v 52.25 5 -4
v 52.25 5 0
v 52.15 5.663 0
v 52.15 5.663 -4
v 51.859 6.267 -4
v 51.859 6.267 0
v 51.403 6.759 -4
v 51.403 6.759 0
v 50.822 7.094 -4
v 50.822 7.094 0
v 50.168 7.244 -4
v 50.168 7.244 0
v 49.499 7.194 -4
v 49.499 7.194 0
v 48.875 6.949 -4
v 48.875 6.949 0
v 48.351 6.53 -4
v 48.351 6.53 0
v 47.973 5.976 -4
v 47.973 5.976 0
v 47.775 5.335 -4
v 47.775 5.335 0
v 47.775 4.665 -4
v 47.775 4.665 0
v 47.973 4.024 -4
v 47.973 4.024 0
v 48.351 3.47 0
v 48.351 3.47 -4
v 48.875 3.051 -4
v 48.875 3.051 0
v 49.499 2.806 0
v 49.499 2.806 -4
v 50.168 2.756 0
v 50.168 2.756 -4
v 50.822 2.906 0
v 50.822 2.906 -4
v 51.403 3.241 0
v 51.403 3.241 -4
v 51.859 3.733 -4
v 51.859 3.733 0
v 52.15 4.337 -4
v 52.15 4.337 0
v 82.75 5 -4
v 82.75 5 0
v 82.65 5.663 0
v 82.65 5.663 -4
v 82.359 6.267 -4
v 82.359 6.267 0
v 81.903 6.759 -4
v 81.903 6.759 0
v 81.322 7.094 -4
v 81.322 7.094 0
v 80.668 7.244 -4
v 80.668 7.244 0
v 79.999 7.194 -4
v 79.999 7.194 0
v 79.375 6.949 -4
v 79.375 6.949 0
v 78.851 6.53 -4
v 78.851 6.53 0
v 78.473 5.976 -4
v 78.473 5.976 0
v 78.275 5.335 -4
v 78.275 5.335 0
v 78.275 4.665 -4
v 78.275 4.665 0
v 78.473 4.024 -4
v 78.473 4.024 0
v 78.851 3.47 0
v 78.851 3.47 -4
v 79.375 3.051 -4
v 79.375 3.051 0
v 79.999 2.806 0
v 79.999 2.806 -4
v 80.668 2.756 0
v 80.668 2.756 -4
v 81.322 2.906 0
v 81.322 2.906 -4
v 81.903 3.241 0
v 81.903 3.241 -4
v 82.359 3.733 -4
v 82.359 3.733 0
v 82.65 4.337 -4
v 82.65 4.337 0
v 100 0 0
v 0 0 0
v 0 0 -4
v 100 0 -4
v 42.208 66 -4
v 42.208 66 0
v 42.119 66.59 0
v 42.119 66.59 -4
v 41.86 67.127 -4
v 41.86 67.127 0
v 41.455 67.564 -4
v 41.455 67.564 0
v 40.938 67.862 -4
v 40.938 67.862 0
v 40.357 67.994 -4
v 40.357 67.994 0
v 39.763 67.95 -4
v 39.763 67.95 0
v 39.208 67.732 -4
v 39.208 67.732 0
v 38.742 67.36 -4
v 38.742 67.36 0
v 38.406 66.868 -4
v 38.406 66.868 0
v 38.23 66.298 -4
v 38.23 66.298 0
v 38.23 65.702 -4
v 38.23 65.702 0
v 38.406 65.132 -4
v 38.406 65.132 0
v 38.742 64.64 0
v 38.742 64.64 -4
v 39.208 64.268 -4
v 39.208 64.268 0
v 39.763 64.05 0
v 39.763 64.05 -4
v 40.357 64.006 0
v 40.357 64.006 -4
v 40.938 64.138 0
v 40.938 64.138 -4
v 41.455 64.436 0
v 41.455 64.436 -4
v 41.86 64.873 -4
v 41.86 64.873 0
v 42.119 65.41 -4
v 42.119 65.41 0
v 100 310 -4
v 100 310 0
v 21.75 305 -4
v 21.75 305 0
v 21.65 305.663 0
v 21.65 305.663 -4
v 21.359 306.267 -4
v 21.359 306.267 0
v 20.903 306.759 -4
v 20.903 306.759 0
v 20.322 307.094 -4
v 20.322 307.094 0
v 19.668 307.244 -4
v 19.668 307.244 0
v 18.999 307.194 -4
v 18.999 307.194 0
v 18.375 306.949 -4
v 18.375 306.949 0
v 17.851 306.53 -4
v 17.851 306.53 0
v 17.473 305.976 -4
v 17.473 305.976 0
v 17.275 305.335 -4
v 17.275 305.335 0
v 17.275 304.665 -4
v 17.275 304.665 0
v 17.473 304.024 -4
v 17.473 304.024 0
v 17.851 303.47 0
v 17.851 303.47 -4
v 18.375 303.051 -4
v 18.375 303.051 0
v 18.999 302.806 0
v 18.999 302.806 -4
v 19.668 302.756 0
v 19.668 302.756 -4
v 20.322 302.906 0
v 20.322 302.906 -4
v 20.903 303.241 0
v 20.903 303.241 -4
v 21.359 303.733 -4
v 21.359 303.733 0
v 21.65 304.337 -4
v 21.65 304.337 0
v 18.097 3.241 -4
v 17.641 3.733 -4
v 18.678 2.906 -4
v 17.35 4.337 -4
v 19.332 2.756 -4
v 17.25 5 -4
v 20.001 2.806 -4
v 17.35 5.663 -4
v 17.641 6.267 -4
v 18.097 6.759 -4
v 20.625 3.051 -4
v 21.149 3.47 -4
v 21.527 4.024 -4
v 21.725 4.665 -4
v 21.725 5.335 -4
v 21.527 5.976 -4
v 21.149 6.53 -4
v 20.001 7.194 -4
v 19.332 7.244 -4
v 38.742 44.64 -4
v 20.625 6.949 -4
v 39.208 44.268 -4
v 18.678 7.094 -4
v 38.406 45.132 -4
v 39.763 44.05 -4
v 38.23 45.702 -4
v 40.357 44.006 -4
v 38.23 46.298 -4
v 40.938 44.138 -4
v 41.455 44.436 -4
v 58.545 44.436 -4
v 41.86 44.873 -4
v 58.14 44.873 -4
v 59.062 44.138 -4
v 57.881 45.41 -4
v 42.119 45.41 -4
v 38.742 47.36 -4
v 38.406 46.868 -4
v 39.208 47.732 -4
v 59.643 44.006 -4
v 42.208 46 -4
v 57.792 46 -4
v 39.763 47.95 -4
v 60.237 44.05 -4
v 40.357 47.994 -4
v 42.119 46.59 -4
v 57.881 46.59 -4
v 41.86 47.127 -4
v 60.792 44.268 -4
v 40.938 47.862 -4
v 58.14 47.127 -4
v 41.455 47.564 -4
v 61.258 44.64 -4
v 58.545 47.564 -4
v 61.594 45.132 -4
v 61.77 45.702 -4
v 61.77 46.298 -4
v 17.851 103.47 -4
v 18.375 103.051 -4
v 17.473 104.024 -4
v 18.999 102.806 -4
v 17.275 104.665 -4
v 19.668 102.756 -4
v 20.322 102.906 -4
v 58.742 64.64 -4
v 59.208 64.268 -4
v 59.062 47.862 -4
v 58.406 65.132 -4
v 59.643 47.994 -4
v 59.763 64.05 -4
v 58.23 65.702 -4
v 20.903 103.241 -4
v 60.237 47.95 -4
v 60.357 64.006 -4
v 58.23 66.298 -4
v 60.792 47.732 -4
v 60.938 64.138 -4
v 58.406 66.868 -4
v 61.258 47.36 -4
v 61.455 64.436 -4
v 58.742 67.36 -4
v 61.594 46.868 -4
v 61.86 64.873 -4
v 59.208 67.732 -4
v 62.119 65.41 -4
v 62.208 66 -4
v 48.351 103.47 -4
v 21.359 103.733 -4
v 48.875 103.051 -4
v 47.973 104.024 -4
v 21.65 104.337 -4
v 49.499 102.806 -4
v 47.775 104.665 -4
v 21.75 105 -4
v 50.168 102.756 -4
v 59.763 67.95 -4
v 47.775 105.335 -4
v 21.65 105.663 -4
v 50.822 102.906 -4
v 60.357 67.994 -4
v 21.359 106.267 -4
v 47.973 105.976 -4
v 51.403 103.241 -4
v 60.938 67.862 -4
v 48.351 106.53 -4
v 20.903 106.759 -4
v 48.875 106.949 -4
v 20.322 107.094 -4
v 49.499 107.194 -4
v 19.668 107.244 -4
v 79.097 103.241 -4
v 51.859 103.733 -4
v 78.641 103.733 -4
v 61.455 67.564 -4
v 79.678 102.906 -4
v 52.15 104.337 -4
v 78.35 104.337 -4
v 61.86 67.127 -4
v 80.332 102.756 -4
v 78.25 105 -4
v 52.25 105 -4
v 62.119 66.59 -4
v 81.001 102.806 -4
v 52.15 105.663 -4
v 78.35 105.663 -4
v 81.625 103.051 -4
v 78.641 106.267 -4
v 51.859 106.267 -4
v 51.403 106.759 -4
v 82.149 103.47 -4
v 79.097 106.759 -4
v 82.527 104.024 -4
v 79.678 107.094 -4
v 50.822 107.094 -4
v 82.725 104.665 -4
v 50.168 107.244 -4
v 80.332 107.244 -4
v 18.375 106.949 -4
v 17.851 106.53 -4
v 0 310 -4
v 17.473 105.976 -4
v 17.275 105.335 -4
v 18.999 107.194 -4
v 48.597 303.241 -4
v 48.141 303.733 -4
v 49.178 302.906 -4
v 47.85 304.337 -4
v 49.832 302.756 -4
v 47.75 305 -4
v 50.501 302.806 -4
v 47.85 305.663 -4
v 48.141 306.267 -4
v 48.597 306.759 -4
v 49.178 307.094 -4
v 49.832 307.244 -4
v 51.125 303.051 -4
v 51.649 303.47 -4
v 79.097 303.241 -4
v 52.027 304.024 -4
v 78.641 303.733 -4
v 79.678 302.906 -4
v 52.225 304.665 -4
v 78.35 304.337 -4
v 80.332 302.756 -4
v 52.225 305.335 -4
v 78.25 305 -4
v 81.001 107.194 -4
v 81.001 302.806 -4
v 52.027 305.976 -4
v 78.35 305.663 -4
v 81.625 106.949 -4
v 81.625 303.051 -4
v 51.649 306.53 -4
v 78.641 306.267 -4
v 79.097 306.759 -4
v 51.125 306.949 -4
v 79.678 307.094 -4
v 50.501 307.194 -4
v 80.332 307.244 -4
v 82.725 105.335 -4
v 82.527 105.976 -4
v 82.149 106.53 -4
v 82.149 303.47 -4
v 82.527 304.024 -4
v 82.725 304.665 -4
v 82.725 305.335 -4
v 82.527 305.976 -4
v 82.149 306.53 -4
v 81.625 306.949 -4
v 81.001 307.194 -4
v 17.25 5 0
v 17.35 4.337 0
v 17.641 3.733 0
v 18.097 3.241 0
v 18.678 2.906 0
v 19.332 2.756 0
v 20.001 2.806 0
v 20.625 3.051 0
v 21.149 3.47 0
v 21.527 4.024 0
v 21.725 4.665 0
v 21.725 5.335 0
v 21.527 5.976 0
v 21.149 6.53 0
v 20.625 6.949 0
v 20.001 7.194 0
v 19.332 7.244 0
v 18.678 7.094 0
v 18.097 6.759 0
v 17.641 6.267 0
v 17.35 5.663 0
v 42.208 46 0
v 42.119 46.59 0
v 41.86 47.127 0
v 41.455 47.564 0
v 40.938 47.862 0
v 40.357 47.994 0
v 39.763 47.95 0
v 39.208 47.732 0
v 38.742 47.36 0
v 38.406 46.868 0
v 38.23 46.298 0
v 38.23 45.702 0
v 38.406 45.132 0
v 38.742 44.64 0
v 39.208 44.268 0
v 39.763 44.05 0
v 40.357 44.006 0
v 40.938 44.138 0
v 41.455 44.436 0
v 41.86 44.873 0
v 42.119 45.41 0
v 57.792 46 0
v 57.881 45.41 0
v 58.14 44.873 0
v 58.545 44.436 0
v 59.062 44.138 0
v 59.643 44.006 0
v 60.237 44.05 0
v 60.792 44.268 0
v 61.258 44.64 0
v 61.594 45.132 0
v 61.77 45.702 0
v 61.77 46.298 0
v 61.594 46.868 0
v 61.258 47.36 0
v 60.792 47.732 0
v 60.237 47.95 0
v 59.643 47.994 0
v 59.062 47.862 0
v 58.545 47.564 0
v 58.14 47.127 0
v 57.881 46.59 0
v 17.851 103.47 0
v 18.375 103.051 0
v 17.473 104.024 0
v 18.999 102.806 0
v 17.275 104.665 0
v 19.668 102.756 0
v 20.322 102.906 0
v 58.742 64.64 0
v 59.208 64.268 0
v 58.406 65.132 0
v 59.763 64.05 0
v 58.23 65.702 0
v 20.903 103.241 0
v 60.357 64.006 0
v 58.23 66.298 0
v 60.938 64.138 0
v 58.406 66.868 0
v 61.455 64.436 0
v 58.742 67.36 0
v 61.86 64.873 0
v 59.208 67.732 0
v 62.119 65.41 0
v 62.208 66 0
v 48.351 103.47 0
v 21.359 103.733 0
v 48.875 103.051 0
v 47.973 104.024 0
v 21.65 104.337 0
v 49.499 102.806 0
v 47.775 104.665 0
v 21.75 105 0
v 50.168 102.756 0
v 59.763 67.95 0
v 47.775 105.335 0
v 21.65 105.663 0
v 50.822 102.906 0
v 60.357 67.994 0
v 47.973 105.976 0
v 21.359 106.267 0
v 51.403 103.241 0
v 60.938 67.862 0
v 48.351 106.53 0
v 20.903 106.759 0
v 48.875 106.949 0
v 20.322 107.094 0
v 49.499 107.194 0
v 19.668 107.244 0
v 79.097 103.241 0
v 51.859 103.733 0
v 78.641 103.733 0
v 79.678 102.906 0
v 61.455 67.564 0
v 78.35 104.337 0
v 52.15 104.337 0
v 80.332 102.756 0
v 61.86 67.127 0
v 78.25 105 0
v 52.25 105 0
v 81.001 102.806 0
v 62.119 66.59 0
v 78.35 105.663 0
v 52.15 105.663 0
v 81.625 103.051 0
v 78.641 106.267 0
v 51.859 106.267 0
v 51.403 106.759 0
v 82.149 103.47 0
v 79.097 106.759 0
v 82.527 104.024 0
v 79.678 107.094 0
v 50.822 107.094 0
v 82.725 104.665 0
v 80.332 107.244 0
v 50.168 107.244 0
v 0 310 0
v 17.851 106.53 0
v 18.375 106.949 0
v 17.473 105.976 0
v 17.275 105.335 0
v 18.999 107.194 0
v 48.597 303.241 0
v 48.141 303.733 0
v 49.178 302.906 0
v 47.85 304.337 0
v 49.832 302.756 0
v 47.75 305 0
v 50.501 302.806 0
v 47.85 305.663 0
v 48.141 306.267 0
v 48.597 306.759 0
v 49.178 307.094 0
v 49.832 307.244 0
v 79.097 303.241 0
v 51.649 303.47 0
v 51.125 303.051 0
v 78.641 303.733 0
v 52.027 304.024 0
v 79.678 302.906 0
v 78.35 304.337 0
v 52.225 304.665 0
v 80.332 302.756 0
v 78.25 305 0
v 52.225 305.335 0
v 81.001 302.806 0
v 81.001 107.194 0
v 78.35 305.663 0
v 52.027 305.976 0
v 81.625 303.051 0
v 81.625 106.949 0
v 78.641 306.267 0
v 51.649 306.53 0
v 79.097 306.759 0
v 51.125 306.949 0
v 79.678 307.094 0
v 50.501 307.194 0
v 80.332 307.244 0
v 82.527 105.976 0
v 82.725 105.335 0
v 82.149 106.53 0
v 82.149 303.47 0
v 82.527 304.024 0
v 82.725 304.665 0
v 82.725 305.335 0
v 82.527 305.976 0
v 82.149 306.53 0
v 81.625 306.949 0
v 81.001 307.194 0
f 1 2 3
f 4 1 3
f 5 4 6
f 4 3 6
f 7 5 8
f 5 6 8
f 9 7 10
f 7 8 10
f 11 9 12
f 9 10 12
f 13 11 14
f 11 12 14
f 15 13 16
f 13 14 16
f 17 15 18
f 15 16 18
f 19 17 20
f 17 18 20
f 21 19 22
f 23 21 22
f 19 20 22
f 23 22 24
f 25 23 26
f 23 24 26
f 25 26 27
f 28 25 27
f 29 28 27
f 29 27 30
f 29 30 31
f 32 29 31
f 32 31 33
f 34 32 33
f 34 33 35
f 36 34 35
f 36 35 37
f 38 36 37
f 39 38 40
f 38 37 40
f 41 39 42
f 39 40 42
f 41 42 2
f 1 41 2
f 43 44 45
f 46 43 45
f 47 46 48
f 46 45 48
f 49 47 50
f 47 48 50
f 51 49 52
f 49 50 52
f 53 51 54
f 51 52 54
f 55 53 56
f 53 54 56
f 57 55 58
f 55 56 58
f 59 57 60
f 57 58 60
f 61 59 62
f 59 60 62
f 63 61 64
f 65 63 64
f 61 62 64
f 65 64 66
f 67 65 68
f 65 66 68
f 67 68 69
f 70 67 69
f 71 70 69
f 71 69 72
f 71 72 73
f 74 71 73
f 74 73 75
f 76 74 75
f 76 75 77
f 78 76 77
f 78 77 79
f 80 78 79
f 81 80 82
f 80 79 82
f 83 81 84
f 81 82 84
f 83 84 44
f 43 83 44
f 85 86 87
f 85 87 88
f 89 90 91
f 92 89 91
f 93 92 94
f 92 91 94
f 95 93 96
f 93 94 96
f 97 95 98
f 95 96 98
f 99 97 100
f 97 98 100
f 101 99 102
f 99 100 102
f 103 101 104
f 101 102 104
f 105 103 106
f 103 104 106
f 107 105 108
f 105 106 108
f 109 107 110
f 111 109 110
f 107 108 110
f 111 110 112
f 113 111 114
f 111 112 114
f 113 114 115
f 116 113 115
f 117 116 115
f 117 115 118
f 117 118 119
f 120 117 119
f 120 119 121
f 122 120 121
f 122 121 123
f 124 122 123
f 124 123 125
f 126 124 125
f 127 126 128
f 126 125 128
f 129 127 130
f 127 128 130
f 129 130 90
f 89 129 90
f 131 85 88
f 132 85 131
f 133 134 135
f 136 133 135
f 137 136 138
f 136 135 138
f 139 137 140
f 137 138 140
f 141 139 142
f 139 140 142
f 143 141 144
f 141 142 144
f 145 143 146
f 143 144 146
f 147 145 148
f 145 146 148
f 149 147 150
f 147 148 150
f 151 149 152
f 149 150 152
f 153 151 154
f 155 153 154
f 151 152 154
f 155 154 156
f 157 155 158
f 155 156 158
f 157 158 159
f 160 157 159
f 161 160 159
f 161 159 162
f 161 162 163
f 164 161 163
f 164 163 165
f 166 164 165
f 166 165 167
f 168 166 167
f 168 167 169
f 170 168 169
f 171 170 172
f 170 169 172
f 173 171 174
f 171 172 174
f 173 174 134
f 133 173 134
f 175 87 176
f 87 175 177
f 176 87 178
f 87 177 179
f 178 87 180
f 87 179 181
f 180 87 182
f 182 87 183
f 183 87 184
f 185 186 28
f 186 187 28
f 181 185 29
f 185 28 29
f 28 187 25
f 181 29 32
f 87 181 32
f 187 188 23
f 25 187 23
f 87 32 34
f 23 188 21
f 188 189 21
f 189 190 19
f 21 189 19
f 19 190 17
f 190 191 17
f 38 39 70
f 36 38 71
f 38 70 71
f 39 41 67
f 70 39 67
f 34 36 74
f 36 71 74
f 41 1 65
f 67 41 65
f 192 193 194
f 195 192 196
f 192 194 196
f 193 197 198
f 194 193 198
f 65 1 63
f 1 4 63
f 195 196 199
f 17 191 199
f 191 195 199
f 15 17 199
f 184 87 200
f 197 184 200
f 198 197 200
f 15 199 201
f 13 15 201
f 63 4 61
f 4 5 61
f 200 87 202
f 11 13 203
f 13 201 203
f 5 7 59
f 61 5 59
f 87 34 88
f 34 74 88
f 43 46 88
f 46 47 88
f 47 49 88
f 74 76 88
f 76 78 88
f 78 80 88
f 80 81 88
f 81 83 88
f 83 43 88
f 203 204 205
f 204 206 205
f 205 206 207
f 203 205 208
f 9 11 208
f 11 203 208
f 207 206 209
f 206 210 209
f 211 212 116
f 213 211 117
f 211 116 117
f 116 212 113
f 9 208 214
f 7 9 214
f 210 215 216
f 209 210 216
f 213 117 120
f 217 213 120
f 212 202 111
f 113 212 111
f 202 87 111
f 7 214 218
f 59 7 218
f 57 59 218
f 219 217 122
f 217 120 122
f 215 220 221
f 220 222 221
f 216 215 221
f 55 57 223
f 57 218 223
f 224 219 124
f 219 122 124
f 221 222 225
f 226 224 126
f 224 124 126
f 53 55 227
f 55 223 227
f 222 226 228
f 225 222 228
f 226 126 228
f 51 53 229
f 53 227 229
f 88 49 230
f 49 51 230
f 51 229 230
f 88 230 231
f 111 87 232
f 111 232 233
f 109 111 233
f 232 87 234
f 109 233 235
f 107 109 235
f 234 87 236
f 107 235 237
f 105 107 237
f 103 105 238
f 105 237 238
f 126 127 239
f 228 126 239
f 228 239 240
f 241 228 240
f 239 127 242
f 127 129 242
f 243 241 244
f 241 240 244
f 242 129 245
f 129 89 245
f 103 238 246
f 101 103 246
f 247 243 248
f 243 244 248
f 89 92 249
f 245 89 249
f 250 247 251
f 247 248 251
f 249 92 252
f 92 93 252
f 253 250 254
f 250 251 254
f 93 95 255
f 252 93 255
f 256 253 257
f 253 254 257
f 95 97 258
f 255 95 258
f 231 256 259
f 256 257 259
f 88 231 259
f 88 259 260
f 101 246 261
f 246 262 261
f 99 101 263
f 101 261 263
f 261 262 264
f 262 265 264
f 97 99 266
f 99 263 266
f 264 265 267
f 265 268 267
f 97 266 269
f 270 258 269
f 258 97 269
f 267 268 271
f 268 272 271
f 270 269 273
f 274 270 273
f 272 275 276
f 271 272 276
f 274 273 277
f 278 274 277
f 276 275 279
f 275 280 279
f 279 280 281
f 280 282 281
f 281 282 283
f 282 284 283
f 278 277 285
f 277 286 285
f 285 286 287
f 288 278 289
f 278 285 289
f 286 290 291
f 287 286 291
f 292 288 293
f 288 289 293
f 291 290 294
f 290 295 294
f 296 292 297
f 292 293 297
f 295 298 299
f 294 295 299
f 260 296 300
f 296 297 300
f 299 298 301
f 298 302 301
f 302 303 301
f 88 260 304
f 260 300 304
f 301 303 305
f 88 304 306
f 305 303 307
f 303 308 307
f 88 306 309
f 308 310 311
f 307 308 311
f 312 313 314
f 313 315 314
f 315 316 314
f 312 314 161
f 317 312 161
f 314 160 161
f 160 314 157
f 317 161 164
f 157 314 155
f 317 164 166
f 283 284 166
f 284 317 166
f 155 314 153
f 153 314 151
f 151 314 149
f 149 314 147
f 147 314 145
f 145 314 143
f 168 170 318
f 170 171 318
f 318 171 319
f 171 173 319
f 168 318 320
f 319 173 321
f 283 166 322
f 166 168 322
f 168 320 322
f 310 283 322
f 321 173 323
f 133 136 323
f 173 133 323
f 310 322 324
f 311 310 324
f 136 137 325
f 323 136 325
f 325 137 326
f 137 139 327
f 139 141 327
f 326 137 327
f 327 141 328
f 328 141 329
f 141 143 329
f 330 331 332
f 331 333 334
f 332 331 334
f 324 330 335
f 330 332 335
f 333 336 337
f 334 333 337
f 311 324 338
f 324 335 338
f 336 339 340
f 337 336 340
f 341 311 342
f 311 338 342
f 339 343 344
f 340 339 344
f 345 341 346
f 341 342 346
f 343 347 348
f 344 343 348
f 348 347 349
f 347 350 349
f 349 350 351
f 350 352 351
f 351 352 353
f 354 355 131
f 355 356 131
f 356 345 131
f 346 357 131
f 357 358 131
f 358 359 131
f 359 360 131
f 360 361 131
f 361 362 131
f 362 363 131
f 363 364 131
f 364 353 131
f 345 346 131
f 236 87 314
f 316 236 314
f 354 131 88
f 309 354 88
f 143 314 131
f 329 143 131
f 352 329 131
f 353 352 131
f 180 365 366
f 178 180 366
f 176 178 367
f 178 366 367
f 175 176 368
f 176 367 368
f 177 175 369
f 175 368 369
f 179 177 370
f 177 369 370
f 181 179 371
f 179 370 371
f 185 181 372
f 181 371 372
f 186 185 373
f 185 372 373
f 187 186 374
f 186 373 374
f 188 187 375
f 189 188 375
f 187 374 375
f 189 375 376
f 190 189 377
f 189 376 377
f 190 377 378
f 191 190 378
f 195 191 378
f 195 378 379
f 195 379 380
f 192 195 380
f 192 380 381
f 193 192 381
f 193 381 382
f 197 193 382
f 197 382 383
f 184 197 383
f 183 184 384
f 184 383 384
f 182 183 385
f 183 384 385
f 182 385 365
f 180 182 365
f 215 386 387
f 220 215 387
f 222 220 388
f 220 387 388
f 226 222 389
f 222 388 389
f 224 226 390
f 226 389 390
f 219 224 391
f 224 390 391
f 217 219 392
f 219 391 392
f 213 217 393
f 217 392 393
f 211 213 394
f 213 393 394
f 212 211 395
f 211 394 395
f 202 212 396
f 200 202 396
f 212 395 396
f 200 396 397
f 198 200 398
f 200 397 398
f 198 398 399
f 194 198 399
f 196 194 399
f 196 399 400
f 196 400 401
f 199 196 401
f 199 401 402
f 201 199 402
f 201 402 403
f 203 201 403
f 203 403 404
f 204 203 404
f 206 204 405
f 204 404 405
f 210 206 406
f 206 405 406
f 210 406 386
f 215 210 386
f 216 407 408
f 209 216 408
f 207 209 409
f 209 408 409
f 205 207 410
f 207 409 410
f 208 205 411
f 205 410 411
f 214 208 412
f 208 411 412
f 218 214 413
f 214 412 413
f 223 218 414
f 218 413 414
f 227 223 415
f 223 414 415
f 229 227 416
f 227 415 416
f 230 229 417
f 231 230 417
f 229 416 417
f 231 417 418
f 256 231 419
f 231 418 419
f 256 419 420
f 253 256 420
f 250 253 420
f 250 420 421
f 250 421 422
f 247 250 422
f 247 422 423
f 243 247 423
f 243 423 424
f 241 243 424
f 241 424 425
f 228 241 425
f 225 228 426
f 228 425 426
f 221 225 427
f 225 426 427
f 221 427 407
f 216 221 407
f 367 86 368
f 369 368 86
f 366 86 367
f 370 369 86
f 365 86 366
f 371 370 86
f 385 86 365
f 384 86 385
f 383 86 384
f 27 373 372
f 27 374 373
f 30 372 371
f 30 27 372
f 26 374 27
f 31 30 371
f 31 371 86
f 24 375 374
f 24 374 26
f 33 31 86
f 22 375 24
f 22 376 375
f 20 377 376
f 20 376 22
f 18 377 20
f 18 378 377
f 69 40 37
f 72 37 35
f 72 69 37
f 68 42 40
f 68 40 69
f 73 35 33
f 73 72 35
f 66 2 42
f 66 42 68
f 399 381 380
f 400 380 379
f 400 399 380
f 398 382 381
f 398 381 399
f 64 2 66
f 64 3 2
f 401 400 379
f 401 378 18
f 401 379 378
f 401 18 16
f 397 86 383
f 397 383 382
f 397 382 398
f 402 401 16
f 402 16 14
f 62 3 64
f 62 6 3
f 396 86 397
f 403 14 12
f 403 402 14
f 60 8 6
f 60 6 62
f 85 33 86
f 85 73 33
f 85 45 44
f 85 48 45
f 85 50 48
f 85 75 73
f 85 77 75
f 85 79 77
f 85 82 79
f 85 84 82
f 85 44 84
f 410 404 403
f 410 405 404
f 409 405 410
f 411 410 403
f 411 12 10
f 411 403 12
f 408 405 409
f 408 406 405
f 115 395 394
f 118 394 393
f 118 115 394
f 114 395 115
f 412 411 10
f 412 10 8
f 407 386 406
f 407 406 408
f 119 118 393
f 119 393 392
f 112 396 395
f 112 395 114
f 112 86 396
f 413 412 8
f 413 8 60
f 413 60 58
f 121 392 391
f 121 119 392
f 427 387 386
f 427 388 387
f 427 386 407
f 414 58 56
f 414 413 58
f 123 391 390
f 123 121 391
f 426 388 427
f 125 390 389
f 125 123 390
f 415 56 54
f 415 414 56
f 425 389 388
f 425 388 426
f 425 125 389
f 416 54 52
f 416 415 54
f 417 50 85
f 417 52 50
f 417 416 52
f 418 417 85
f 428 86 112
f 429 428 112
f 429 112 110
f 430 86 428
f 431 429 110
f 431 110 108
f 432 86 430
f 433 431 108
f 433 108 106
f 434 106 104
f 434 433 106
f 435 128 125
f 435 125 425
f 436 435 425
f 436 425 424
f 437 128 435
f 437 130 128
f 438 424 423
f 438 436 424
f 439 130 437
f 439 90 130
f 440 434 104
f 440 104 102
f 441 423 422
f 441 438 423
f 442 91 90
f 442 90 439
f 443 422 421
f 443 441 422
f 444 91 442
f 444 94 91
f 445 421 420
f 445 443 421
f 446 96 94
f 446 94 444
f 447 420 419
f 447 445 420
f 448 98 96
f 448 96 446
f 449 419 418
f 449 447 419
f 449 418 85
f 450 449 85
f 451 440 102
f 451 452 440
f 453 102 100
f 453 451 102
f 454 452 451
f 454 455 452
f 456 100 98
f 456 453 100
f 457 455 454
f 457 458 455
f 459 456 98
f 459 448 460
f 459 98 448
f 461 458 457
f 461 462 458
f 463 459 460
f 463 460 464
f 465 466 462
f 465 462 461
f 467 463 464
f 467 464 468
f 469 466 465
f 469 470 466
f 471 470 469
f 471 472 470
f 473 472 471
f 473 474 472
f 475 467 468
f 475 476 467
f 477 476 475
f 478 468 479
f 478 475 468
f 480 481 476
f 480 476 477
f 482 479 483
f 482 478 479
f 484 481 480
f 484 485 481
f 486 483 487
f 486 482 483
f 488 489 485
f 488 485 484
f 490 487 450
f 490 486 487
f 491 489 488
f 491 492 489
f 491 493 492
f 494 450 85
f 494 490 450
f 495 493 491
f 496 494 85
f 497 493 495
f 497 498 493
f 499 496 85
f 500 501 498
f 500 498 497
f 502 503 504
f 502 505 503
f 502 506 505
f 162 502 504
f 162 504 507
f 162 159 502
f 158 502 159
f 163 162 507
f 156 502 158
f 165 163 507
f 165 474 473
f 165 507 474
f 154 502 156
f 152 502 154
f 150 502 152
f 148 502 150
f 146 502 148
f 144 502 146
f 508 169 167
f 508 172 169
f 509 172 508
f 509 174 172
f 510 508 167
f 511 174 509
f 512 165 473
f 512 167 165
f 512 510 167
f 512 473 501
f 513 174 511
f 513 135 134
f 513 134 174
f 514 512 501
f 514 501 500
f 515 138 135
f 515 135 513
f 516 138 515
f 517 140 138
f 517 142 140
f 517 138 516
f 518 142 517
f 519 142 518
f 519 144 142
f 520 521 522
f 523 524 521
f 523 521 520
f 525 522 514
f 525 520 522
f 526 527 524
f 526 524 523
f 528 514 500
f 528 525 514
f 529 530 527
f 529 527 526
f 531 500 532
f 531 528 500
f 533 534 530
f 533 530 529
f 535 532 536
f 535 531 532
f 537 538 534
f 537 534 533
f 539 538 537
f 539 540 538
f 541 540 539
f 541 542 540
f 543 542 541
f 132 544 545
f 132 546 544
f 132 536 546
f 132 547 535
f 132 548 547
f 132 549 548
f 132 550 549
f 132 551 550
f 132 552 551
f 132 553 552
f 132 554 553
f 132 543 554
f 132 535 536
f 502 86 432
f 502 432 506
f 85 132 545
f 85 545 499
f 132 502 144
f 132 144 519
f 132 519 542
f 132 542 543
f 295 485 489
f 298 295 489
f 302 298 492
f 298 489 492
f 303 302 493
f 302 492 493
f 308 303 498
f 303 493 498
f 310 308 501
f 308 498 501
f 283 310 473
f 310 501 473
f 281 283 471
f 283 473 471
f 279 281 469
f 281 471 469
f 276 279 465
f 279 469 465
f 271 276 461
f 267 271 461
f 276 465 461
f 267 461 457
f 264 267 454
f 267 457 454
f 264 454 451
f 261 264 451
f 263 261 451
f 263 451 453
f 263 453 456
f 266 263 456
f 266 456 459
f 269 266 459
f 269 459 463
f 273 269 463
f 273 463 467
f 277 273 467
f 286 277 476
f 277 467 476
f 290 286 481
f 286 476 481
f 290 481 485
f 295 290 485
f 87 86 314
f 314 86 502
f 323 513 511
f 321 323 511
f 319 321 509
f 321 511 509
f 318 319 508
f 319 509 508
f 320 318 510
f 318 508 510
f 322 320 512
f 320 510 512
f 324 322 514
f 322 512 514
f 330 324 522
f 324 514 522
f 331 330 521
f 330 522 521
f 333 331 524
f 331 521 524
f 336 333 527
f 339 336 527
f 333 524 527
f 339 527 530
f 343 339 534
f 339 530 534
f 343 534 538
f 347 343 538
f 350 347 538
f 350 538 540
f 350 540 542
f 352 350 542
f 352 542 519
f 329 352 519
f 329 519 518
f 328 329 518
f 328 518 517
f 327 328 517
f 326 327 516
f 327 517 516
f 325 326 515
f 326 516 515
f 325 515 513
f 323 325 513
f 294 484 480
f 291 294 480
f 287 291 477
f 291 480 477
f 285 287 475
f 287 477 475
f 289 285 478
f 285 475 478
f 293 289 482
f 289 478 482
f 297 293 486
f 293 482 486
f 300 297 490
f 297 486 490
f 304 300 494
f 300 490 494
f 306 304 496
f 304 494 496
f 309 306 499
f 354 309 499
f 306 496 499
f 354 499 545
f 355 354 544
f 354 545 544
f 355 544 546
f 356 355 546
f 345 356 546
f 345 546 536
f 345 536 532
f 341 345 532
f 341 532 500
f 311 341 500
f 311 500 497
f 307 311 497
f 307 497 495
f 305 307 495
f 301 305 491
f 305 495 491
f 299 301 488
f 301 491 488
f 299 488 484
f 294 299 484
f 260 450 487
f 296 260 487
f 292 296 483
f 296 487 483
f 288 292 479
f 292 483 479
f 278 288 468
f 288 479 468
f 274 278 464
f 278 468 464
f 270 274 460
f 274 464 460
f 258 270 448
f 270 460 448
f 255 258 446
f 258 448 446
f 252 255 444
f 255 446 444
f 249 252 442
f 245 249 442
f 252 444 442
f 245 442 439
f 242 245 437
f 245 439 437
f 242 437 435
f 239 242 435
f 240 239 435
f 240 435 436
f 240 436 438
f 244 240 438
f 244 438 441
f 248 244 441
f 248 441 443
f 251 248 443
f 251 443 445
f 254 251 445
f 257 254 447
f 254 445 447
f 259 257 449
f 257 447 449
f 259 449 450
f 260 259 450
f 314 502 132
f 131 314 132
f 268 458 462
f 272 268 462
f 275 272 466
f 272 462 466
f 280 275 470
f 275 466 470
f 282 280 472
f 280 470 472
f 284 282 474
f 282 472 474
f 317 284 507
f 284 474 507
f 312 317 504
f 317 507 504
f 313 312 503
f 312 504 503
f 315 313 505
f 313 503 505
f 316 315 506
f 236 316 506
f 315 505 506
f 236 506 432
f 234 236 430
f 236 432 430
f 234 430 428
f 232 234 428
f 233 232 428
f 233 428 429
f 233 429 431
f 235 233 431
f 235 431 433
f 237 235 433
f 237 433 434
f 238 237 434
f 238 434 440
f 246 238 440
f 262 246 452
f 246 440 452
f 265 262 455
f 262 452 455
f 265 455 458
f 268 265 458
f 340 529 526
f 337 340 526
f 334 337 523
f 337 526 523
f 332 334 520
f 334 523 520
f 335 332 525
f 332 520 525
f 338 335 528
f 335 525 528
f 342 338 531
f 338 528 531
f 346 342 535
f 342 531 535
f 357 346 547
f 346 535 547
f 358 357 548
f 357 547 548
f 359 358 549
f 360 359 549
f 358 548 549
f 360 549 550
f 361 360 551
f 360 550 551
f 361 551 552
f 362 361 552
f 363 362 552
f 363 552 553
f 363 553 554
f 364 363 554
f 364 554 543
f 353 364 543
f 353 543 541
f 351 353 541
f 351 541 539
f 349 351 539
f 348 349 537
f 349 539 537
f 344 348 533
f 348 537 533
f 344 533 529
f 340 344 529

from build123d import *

# Parameters (mm, degrees)
SCHIZZO1_W                   = 100
SCHIZZO1_H                   = 310
SCHIZZO1_R                   = 2.25
SCHIZZO1_R_2                 = 2
ESTRUSIONE_ESTRUSIONE1_DEPTH = 4


with BuildPart() as part:
    # Schizzo1 → Estrusione-Estrusione1 (new body)
    with BuildSketch(Plane.XY):
        with Locations((50, 155)):
            Rectangle(SCHIZZO1_W, SCHIZZO1_H)
        with Locations((80.5, 5)):
            Circle(SCHIZZO1_R, mode=Mode.SUBTRACT)
        with Locations((50, 5)):
            Circle(SCHIZZO1_R, mode=Mode.SUBTRACT)
        with Locations(Location((19.5, 5, 0), (0, 0, 180))):
            Circle(SCHIZZO1_R, mode=Mode.SUBTRACT)
        with Locations((19.5, 305)):
            Circle(SCHIZZO1_R, mode=Mode.SUBTRACT)
        with Locations(Location((50, 305, 0), (0, 0, 180))):
            Circle(SCHIZZO1_R, mode=Mode.SUBTRACT)
        with Locations(Location((80.5, 305, 0), (0, 0, 180))):
            Circle(SCHIZZO1_R, mode=Mode.SUBTRACT)
        with Locations((40.207634416, 46)):
            Circle(SCHIZZO1_R_2, mode=Mode.SUBTRACT)
        with Locations(Location((59.792365584, 46, 0), (0, 0, 180))):
            Circle(SCHIZZO1_R_2, mode=Mode.SUBTRACT)
        with Locations((40.207634416, 66)):
            Circle(SCHIZZO1_R_2, mode=Mode.SUBTRACT)
        with Locations((60.207634416, 66)):
            Circle(SCHIZZO1_R_2, mode=Mode.SUBTRACT)
        with Locations((50, 105)):
            Circle(SCHIZZO1_R, mode=Mode.SUBTRACT)
        with Locations(Location((80.5, 105, 0), (0, 0, 180))):
            Circle(SCHIZZO1_R, mode=Mode.SUBTRACT)
        with Locations((19.5, 105)):
            Circle(SCHIZZO1_R, mode=Mode.SUBTRACT)
    extrude(amount=-ESTRUSIONE_ESTRUSIONE1_DEPTH)


solid = part.part
